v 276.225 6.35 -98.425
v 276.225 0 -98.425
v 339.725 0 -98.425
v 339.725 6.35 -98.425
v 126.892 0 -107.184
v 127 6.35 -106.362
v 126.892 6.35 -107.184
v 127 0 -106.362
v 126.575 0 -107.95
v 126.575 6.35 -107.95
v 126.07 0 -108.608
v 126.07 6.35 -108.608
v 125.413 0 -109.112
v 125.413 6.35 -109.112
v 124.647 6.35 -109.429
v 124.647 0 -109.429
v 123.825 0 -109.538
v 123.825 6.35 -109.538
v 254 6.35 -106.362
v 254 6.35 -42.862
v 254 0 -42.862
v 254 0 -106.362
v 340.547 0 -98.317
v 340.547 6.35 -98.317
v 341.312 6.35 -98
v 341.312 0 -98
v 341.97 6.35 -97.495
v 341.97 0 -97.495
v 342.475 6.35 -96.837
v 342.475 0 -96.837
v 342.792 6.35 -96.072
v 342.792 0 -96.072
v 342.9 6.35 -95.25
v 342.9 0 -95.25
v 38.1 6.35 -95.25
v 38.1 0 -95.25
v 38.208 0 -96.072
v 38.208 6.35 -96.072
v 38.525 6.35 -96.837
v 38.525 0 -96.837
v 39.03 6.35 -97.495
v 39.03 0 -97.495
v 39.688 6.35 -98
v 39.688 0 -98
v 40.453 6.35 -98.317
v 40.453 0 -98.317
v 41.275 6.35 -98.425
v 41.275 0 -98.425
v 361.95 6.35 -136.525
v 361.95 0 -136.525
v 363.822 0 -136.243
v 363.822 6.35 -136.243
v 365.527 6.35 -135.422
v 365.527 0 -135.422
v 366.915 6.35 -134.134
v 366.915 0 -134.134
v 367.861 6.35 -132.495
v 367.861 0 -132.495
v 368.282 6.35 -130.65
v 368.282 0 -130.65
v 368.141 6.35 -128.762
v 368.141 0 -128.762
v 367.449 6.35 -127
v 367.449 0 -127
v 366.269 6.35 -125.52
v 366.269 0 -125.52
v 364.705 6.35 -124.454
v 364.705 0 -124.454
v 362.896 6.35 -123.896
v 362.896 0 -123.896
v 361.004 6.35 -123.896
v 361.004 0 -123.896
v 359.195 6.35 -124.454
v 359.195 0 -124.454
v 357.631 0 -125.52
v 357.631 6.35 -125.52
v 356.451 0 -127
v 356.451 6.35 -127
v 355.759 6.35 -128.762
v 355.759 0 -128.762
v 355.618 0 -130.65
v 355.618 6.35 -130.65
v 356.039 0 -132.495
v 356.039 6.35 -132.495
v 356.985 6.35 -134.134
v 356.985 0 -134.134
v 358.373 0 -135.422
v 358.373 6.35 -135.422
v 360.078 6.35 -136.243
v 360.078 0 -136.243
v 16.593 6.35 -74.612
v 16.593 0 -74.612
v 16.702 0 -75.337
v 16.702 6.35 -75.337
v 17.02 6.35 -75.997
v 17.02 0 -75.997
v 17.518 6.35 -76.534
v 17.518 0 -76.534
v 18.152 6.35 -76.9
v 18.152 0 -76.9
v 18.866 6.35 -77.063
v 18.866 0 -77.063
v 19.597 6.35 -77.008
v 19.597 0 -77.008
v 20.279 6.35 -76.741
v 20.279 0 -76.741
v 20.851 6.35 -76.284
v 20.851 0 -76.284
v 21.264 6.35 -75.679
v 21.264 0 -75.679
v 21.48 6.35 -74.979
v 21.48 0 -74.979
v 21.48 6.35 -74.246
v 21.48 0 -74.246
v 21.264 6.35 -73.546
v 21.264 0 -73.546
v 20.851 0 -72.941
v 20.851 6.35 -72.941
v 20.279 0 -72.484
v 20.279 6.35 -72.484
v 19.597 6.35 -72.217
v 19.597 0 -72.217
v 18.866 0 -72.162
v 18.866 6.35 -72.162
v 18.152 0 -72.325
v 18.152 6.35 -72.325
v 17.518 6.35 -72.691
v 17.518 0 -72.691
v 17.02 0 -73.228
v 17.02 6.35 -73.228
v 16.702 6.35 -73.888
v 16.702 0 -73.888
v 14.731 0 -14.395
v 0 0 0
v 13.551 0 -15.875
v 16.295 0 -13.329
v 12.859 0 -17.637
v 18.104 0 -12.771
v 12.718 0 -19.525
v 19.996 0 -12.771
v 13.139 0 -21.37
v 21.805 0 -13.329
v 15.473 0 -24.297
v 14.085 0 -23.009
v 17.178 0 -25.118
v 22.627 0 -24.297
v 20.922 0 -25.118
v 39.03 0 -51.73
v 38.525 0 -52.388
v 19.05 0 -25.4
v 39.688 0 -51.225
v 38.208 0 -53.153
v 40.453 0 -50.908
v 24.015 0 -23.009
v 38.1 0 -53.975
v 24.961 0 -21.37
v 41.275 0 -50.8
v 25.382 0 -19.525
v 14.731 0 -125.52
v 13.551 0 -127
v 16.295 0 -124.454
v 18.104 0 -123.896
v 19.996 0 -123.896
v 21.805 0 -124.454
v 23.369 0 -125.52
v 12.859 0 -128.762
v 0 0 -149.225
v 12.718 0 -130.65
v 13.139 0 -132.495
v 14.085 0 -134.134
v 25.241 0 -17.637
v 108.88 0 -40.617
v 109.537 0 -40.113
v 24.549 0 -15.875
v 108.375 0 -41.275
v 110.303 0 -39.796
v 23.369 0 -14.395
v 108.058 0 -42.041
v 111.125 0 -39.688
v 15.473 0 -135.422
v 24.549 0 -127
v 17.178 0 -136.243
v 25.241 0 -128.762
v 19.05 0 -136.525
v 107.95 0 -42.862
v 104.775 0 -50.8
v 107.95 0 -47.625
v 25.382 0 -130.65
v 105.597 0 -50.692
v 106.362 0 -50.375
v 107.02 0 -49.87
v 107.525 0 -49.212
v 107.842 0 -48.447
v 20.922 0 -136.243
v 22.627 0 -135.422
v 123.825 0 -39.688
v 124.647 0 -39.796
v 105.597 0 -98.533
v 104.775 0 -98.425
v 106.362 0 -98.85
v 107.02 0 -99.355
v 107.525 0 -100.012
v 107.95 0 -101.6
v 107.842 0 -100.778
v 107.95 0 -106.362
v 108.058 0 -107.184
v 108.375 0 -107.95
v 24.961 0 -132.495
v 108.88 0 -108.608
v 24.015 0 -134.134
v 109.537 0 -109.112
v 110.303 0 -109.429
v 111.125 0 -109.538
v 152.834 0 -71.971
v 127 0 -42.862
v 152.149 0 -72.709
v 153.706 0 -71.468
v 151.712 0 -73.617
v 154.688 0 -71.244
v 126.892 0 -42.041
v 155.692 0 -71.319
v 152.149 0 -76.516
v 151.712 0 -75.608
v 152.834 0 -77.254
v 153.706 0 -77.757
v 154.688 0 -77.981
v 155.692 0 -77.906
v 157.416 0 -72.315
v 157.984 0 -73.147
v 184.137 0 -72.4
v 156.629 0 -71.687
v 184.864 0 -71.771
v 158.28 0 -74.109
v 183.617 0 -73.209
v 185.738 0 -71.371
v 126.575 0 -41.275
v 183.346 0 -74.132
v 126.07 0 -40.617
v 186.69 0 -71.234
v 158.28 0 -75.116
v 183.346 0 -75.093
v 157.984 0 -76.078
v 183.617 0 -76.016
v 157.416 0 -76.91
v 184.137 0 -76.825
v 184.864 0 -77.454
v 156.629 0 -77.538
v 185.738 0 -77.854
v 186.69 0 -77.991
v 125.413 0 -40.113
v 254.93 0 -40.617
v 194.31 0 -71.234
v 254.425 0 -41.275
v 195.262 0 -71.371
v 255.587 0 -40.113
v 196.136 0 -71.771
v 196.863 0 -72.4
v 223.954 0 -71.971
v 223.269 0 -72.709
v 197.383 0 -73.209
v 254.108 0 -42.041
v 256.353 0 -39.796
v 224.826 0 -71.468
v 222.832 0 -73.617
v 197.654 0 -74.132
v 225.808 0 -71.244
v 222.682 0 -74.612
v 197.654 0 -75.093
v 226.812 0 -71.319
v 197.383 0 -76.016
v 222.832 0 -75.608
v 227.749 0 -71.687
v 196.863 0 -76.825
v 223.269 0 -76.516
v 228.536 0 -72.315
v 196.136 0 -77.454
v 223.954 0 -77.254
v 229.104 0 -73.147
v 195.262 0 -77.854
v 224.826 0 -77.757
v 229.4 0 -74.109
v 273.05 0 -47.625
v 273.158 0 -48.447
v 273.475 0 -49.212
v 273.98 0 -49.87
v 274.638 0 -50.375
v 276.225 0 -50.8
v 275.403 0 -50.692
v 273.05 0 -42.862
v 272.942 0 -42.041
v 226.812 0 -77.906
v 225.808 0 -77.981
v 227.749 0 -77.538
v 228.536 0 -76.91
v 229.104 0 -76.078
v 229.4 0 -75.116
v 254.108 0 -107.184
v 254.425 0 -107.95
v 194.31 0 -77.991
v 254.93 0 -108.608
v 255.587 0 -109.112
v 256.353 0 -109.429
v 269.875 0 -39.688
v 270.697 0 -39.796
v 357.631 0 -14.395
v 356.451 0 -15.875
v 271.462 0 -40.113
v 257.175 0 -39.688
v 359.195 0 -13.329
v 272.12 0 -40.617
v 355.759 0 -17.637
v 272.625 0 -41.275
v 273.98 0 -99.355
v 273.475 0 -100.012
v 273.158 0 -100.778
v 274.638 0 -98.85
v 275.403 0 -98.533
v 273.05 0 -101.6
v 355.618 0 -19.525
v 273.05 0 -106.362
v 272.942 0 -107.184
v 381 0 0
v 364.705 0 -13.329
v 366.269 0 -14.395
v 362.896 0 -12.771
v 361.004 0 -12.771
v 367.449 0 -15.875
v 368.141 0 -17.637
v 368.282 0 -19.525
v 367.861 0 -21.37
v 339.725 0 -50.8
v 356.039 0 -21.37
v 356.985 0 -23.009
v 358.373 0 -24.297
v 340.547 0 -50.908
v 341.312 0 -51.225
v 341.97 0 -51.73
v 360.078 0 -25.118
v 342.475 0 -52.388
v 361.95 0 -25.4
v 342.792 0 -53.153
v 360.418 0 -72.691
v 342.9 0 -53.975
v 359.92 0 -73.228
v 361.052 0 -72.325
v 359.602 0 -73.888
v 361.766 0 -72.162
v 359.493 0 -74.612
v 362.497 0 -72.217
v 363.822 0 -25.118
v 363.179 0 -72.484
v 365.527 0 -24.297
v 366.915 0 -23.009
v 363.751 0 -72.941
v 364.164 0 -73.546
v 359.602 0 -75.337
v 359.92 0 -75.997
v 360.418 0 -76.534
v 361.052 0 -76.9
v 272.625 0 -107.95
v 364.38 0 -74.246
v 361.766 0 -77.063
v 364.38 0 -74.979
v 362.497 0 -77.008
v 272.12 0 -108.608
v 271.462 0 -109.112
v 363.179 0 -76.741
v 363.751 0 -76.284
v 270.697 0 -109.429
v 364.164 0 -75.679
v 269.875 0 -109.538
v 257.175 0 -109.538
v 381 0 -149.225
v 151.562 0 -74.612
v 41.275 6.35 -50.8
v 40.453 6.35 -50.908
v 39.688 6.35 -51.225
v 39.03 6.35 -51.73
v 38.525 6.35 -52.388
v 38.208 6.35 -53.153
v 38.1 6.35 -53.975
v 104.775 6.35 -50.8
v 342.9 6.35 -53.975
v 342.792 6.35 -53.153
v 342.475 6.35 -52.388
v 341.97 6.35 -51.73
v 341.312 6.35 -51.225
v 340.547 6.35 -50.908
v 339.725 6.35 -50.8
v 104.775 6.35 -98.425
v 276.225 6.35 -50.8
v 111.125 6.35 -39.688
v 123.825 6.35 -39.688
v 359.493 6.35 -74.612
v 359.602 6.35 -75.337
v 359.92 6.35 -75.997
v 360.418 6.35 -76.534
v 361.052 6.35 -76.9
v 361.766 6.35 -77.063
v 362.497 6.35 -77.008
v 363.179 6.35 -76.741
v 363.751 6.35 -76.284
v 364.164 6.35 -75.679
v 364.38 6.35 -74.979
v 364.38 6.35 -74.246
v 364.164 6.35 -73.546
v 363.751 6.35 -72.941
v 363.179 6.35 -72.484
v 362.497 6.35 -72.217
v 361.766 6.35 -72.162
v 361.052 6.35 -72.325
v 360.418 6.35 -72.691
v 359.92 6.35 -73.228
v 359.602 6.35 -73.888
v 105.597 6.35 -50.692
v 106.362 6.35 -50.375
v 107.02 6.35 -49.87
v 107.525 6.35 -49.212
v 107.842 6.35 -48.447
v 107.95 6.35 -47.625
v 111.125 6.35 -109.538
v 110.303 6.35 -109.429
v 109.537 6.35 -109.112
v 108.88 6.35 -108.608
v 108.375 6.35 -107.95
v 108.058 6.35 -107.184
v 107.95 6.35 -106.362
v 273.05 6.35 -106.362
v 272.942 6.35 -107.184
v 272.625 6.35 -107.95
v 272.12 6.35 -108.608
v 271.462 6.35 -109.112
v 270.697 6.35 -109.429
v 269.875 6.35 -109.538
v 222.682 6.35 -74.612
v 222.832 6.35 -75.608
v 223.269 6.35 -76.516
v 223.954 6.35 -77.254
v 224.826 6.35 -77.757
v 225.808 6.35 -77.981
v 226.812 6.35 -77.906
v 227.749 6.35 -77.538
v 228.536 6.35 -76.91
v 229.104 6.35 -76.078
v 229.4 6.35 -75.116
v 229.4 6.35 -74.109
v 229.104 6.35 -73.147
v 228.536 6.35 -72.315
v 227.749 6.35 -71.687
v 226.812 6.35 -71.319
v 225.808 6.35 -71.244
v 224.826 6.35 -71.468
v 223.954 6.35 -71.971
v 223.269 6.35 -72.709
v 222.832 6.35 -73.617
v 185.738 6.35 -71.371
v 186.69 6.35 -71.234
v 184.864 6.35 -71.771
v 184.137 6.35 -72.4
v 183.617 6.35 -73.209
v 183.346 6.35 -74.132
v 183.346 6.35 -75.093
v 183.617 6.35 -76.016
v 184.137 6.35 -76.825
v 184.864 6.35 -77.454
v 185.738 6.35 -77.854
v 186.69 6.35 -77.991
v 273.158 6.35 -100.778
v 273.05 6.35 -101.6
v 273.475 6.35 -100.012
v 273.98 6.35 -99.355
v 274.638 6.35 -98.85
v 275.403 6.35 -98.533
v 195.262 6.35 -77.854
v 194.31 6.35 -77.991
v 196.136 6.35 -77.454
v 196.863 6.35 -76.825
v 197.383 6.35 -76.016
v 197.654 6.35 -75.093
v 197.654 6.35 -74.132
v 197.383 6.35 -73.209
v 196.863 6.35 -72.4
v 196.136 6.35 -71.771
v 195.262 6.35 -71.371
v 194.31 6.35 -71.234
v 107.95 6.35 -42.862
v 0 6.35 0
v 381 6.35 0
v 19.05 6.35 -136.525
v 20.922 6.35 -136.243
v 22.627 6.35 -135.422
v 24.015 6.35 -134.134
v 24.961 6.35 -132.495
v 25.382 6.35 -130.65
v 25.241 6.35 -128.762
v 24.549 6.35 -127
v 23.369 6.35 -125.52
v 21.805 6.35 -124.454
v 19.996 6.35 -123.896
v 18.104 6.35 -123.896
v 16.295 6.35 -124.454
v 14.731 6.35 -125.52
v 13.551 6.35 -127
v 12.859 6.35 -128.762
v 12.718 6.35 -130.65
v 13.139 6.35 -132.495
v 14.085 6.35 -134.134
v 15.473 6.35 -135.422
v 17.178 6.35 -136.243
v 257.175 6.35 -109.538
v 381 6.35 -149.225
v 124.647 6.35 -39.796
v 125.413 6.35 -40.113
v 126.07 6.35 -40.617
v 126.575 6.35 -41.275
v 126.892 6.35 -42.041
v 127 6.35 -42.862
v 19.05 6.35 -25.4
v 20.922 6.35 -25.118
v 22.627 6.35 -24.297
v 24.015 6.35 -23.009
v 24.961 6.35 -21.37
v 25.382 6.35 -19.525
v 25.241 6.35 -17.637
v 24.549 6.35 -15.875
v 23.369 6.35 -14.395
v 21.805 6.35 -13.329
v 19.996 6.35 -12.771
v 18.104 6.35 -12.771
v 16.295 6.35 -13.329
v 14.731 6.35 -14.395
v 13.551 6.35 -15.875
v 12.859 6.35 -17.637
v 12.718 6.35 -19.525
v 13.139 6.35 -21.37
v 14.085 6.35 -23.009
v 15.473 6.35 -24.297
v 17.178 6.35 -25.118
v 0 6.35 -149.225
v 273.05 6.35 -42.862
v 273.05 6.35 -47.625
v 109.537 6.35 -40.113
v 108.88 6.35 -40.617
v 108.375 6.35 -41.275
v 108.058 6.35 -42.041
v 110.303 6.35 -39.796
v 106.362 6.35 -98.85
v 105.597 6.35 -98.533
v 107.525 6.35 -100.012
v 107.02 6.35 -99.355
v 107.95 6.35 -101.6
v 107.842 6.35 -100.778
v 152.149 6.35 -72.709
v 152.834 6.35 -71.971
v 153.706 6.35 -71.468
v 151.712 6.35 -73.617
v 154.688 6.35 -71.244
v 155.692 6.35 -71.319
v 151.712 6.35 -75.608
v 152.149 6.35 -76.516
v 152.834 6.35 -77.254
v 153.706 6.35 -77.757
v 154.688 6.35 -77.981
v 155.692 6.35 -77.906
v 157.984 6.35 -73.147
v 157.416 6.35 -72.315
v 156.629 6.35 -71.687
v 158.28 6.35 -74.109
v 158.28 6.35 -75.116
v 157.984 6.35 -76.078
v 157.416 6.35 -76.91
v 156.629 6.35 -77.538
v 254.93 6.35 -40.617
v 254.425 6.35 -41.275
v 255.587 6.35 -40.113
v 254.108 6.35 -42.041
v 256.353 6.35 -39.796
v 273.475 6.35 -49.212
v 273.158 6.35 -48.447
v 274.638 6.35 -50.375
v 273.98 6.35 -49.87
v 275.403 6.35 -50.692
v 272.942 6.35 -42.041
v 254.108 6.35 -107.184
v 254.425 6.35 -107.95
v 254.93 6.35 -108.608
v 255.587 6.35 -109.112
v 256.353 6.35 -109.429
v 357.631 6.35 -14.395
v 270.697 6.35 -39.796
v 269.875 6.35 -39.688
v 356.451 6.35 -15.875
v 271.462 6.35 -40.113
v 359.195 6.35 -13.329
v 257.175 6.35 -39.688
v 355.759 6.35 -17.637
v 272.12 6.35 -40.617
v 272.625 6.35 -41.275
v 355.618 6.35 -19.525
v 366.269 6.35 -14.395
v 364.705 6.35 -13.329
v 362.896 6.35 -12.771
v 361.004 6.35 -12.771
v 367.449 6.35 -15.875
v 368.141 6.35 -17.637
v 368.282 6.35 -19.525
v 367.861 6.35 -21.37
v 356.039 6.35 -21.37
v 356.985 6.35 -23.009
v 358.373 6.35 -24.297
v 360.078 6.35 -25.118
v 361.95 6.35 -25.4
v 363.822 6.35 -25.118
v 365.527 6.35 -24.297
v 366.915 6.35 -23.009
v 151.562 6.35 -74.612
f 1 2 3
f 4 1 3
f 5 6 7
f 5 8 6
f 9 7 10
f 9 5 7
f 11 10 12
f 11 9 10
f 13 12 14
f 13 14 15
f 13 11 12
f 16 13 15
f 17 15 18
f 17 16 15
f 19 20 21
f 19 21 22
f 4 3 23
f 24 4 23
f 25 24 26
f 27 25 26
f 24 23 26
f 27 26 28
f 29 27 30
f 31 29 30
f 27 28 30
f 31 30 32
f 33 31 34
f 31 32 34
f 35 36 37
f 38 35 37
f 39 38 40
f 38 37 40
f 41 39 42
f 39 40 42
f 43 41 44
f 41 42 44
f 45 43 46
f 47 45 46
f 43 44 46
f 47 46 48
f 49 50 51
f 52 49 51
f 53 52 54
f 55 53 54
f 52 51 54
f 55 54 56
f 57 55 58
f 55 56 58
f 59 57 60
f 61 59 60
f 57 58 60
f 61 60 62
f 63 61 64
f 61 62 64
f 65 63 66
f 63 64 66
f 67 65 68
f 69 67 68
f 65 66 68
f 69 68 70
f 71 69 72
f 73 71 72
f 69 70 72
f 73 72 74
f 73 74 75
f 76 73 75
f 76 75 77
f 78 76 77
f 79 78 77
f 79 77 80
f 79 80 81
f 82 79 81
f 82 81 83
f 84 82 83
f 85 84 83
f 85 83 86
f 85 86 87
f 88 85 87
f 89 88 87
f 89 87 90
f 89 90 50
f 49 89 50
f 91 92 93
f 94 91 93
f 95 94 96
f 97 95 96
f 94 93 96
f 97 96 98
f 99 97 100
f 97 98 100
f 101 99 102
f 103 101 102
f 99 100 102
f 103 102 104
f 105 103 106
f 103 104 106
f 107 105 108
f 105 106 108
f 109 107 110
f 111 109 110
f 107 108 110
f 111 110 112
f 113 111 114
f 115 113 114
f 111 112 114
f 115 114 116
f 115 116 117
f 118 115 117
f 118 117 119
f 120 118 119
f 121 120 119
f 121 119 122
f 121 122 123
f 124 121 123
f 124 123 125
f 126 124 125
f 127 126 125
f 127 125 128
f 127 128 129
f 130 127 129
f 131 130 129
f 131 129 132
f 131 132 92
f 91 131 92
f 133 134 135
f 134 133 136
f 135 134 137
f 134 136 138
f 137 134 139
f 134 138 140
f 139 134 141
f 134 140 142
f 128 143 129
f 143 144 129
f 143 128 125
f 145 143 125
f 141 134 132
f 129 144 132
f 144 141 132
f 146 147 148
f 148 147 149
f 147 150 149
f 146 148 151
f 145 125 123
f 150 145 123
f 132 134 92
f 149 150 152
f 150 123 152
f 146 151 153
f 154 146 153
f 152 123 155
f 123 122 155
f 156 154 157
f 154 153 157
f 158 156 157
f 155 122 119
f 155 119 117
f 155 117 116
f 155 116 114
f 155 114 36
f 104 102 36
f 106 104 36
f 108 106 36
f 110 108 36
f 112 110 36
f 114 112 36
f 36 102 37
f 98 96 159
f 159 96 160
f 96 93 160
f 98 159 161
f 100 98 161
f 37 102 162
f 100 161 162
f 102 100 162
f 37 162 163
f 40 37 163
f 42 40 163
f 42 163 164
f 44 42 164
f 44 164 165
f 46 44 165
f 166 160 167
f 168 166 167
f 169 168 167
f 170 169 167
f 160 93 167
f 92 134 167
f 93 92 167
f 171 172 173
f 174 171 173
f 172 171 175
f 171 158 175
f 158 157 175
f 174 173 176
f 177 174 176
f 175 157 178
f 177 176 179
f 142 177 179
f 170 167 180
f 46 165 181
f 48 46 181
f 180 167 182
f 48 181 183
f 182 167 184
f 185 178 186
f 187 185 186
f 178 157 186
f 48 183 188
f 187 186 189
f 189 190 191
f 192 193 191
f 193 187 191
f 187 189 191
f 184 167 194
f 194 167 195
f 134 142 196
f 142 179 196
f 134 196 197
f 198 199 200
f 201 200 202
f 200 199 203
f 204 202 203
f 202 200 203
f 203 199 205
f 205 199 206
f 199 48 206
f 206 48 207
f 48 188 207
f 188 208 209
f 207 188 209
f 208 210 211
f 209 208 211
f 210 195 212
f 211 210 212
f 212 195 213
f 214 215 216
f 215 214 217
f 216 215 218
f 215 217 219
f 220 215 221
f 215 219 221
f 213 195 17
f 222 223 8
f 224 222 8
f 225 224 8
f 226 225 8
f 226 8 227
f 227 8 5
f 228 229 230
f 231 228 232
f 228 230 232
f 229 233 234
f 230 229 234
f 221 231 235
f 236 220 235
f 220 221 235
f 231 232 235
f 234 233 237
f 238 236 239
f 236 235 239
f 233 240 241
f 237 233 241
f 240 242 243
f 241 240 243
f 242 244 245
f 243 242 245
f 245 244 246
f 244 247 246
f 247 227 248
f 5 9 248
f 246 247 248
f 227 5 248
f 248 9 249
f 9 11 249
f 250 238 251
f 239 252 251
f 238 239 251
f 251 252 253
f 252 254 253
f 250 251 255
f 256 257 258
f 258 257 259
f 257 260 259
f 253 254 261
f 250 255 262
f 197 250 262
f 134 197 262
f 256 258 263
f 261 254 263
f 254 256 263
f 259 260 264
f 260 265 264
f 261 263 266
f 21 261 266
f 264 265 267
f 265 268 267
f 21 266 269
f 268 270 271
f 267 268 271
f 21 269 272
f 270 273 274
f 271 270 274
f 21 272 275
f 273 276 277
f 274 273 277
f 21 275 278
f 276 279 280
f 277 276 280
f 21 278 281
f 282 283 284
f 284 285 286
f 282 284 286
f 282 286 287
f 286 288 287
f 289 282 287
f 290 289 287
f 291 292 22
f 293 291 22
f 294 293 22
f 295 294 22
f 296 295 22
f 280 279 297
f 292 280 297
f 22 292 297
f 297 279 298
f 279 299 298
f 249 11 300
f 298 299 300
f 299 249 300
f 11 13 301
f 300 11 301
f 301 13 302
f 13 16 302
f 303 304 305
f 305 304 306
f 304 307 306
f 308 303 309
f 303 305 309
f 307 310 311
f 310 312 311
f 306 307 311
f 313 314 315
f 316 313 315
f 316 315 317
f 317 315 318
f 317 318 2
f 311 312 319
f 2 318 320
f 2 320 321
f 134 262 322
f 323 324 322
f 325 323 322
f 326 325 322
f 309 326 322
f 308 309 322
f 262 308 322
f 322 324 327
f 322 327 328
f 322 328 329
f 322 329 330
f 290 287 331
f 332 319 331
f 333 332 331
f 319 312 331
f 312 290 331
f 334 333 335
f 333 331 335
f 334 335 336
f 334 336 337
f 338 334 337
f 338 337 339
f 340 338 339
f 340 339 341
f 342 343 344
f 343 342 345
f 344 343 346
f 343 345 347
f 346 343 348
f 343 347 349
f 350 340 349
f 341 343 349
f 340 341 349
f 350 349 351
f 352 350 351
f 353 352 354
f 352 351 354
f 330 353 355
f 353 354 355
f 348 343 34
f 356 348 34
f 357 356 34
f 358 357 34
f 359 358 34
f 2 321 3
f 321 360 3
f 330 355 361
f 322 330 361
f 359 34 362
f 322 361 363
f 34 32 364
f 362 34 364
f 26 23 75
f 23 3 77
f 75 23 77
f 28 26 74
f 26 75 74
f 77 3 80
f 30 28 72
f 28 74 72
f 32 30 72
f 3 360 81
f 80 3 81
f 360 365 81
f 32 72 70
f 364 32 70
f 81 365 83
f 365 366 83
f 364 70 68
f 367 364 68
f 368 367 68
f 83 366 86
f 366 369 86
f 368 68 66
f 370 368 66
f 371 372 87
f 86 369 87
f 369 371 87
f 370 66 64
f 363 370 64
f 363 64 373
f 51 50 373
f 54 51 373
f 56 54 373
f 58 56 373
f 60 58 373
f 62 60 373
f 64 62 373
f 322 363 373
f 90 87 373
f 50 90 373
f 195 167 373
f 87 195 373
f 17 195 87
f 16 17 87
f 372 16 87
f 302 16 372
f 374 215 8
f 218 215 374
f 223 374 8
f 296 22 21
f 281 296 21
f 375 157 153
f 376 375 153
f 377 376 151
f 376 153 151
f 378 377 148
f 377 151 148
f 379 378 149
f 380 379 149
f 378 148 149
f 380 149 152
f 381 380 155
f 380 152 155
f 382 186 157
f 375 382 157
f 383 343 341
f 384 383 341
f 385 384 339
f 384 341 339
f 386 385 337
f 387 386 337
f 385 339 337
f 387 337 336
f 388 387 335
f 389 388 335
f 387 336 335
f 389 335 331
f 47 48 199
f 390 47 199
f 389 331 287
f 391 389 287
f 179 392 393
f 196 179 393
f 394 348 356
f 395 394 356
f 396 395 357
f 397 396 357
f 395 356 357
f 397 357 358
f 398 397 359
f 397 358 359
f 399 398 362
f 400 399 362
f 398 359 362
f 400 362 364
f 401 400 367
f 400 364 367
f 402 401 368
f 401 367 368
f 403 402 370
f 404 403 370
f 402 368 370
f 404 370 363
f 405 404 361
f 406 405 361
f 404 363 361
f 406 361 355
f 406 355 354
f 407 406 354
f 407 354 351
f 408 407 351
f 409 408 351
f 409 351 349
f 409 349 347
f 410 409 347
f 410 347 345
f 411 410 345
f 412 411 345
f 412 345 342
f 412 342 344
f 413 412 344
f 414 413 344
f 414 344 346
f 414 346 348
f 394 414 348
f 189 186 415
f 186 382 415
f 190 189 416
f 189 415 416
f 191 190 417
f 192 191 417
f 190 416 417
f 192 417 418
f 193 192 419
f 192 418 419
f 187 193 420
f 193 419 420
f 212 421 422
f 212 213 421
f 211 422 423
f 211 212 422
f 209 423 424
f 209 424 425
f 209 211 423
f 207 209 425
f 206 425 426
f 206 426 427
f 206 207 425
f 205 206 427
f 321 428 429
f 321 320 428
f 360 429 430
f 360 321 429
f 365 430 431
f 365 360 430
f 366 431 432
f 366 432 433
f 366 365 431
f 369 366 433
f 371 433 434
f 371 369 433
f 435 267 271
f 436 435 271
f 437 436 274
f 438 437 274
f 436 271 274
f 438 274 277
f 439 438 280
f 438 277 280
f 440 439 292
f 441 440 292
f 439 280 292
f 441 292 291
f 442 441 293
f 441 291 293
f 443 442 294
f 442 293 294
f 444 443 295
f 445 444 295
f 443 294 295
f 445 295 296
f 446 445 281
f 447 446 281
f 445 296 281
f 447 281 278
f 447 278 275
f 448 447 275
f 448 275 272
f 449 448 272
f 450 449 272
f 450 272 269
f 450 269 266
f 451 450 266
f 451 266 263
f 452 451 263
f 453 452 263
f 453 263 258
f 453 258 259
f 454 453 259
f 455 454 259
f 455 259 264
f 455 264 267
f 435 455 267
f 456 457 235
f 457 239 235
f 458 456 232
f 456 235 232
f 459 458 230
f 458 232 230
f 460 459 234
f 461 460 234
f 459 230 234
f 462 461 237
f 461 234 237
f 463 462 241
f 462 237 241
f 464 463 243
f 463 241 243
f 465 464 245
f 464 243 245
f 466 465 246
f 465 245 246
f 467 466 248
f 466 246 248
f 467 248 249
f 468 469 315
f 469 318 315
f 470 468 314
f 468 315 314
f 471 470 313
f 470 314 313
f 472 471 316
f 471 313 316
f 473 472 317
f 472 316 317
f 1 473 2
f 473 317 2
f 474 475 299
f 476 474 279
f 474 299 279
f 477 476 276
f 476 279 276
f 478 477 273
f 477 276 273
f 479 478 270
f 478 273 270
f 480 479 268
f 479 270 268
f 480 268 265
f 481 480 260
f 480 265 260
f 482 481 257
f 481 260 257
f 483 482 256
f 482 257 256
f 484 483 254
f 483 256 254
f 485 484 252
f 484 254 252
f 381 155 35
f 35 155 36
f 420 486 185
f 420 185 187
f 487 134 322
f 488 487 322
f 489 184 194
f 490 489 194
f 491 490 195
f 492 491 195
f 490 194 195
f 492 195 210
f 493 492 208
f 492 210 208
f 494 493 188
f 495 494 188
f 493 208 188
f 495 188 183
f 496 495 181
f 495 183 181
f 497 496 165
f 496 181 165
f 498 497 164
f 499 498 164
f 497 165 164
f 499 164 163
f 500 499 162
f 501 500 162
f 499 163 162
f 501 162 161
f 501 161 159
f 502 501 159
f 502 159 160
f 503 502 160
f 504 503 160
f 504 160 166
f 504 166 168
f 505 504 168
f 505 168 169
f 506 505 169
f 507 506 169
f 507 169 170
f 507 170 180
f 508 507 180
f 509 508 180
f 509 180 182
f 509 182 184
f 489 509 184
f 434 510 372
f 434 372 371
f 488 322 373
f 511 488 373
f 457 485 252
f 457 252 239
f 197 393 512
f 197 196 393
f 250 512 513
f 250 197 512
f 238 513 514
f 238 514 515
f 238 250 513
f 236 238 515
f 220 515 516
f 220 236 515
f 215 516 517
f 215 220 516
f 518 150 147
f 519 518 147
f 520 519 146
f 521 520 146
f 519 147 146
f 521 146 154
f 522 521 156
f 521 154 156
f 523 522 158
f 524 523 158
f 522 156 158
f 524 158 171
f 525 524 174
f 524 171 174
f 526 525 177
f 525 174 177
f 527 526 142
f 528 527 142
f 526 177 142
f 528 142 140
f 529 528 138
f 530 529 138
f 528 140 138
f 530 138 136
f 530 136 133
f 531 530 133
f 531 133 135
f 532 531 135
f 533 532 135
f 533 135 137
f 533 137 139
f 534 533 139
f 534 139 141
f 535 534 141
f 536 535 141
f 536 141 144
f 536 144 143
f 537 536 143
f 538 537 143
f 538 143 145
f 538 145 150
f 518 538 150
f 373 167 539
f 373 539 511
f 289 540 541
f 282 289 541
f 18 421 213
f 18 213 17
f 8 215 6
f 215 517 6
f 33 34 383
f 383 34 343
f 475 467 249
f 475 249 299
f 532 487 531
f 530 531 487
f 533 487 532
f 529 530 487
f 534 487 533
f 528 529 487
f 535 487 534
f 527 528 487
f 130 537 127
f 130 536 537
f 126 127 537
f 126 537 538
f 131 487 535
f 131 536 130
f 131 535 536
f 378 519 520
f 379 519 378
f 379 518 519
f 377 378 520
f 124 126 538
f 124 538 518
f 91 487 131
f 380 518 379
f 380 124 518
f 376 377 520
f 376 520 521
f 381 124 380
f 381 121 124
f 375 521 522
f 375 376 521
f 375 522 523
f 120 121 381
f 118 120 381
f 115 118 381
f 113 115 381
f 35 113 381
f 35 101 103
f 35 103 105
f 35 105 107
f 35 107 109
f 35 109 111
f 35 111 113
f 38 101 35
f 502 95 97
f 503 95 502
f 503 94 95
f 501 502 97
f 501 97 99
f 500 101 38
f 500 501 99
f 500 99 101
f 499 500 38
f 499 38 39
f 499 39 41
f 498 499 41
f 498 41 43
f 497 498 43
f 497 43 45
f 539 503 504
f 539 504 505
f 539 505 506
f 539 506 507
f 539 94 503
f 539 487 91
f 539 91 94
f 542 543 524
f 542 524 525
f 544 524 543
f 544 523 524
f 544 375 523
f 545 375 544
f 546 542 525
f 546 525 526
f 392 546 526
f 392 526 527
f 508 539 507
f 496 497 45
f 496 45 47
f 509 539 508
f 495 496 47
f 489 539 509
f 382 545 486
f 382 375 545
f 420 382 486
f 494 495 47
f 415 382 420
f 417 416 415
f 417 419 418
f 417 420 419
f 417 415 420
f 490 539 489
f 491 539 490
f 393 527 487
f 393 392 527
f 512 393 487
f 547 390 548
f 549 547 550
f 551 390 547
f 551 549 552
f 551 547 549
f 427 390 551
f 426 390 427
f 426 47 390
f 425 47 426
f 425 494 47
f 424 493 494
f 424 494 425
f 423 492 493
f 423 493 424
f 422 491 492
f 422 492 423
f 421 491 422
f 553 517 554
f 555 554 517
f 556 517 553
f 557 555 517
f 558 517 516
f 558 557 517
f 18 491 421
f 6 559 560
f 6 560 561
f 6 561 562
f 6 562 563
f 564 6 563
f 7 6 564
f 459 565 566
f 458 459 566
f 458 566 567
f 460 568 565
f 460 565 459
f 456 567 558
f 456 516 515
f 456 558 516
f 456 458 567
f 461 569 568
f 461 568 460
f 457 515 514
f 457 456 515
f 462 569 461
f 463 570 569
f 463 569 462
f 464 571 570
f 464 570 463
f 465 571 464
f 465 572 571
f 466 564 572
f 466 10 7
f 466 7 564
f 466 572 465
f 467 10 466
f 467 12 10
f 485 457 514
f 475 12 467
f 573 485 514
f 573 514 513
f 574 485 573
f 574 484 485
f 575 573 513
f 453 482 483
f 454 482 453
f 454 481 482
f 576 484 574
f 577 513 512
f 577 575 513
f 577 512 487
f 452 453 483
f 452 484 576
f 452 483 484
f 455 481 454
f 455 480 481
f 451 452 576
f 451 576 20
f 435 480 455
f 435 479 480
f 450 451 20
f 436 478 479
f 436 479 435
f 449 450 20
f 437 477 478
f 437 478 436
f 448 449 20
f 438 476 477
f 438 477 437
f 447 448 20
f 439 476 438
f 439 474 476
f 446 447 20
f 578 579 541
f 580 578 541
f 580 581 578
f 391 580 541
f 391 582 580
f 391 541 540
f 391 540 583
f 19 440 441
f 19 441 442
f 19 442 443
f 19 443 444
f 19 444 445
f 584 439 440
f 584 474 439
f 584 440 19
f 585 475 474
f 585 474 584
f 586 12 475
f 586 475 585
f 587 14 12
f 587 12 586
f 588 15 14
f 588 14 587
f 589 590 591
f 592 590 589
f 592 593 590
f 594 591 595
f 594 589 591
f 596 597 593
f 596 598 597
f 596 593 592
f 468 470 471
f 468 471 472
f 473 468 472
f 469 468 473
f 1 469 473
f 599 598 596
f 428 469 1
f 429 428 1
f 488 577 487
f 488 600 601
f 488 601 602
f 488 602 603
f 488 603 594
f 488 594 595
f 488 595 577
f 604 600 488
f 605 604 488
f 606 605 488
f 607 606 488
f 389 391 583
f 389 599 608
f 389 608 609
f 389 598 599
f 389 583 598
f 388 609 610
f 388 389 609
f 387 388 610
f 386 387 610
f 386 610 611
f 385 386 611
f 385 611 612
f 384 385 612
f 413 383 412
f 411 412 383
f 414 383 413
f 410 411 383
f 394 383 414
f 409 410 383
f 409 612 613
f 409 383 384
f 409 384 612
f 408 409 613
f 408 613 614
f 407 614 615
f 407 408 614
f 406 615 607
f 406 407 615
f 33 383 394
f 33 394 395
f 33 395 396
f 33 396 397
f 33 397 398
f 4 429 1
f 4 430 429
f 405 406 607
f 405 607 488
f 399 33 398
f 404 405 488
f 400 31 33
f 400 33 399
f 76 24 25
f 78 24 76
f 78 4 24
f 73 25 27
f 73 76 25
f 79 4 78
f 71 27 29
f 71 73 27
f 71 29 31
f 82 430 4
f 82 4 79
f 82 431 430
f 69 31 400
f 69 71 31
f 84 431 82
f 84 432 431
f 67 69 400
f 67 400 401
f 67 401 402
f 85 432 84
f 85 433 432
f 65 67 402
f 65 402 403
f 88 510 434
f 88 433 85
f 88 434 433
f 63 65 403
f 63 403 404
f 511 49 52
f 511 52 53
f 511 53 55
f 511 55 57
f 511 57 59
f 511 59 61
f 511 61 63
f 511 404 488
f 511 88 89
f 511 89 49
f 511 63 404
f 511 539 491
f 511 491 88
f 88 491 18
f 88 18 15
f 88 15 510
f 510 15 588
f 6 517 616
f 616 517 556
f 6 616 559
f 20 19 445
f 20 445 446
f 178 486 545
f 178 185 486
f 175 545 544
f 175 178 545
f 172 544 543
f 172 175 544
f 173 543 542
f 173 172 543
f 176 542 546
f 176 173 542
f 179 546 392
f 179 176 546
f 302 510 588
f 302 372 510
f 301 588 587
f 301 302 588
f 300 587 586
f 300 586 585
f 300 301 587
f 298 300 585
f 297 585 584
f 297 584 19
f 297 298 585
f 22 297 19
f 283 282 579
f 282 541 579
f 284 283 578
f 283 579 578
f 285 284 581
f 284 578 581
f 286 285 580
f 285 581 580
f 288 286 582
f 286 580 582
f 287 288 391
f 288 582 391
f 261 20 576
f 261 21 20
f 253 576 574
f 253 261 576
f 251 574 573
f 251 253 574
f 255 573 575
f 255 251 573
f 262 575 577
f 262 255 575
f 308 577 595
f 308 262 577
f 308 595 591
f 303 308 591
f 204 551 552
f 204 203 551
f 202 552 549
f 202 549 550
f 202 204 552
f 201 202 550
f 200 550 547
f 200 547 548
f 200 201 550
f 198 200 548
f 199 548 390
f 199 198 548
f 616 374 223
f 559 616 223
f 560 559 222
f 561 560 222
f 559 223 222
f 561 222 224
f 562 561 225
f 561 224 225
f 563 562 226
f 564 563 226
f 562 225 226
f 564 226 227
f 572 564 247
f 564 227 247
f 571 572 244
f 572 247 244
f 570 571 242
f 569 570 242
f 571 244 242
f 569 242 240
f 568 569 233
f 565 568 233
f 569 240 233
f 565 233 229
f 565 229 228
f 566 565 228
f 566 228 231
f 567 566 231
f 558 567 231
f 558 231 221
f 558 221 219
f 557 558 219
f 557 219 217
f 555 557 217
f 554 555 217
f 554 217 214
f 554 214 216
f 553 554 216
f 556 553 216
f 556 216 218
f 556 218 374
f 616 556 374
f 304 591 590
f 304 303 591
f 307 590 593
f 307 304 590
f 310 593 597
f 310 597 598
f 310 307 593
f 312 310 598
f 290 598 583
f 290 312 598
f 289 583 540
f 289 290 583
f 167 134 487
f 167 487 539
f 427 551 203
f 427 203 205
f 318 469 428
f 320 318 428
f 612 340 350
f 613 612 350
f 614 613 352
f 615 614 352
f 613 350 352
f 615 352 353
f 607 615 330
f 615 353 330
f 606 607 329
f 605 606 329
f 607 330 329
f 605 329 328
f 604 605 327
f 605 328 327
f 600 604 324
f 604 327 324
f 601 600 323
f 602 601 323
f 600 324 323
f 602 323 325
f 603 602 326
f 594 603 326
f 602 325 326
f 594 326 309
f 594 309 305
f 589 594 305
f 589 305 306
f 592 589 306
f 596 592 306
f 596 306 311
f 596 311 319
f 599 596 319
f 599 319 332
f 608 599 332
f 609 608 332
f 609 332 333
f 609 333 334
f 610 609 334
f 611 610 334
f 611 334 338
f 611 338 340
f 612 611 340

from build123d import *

# Parameters (mm, degrees)
SKETCH1_W                    = 381
SKETCH1_H                    = 149.225
BOSS_EXTRUDE1_DEPTH          = 6.35
F_1_4_CLEARANCE_HOLE1_D      = 6.7564
CUT_EXTRUDE1_DEPTH           = 410.23028129
F_1_2_0_5_DIAMETER_HOLE1_D   = 12.7
F_10_0_1935_DIAMETER_HOLE1_D = 4.9149
SKETCH9_W                    = 19.05
SKETCH9_H                    = 14.2875
CUT_EXTRUDE2_DEPTH           = 410.23028129
FILLET1_R                    = 3.175


with BuildPart() as part:
    # Sketch1 → Boss-Extrude1 (new body)
    with BuildSketch(Plane(origin=(0, 0, 0), x_dir=(1, 0, 0), z_dir=(0, 1, 0))):
        with Locations((190.5, 74.6125)):
            Rectangle(SKETCH1_W, SKETCH1_H)
        with BuildLine():
            Line((342.9, 95.25), (342.9, 53.975))
            ThreePointArc((342.9, 53.975), (341.97006403, 51.72993597), (339.725, 50.8))
            Line((339.725, 50.8), (257.175, 50.8))
            ThreePointArc((257.175, 50.8), (254.92993597, 51.72993597), (254, 53.975))
            Line((254, 53.975), (254, 95.25))
            ThreePointArc((254, 95.25), (254.92993597, 97.49506403), (257.175, 98.425))
            Line((257.175, 98.425), (339.725, 98.425))
            ThreePointArc((339.725, 98.425), (341.97006403, 97.49506403), (342.9, 95.25))
        make_face(mode=Mode.SUBTRACT)
        with BuildLine():
            Line((41.275, 98.425), (123.825, 98.425))
            ThreePointArc((123.825, 98.425), (126.07006403, 97.49506403), (127, 95.25))
            Line((127, 95.25), (127, 53.975))
            ThreePointArc((127, 53.975), (126.07006403, 51.72993597), (123.825, 50.8))
            Line((123.825, 50.8), (41.275, 50.8))
            ThreePointArc((41.275, 50.8), (39.02993597, 51.72993597), (38.1, 53.975))
            Line((38.1, 53.975), (38.1, 95.25))
            ThreePointArc((38.1, 95.25), (39.02993597, 97.49506403), (41.275, 98.425))
        make_face(mode=Mode.SUBTRACT)
    extrude(amount=BOSS_EXTRUDE1_DEPTH)

    # 1/4 Clearance Hole1 (through all)
    with Locations(Plane(origin=(0, 6.35, 0), x_dir=(1, 0, 0), z_dir=(0, 1, 0))):
        with Locations((154.94, 74.6125), (186.69, 74.6125), (194.31, 74.6125), (226.06, 74.6125)):
            Hole(F_1_4_CLEARANCE_HOLE1_D / 2)

    # Sketch4 → Cut-Extrude1 (cut, through all)
    with BuildSketch(Plane(origin=(0, 6.35, 0), x_dir=(1, 0, 0), z_dir=(0, 1, 0))):
        with BuildLine():
            Line((186.69, 77.9907), (194.31, 77.9907))
            ThreePointArc((194.31, 77.9907), (197.6882, 74.6125), (194.31, 71.2343))
            Line((194.31, 71.2343), (186.69, 71.2343))
            ThreePointArc((186.69, 71.2343), (183.3118, 74.6125), (186.69, 77.9907))
        make_face()
    extrude(amount=-CUT_EXTRUDE1_DEPTH, mode=Mode.SUBTRACT)

    # 1/2 (0.5) Diameter Hole1 (through all)
    with Locations(Plane(origin=(19.05, 6.35, -130.175), x_dir=(0, 0, 1), z_dir=(0, 1, 0))):
        with Locations((0, 0), (111.125, 0), (0, 342.9), (111.125, 342.9)):
            Hole(F_1_2_0_5_DIAMETER_HOLE1_D / 2)

    # #10 (0.1935) Diameter Hole1 (through all)
    with Locations(Plane(origin=(0, 6.35, 0), x_dir=(1, 0, 0), z_dir=(0, 1, 0))):
        with Locations((19.05, 74.6125), (361.95, 74.6125)):
            Hole(F_10_0_1935_DIAMETER_HOLE1_D / 2)

    # Sketch9 → Cut-Extrude2 (cut, through all)
    with BuildSketch(Plane(origin=(0, 6.35, 0), x_dir=(1, 0, 0), z_dir=(0, 1, 0))):
        with Locations((117.475, 102.39375)):
            Rectangle(SKETCH9_W, SKETCH9_H)
        with Locations((117.475, 46.83125)):
            Rectangle(SKETCH9_W, SKETCH9_H)
        with Locations((263.525, 46.83125)):
            Rectangle(SKETCH9_W, SKETCH9_H)
        with Locations((263.525, 102.39375)):
            Rectangle(SKETCH9_W, SKETCH9_H)
    extrude(amount=-CUT_EXTRUDE2_DEPTH, mode=Mode.SUBTRACT)

    # Fillet1
    fillet1_edges = [part.edges().sort_by_distance(p)[0] for p in [
        (273.05, 3.175, -50.8),
        (273.05, 3.175, -98.425),
        (107.95, 3.175, -98.425),
        (107.95, 3.175, -50.8),
        (273.05, 3.175, -109.5375),
        (254, 3.175, -109.5375),
        (273.05, 3.175, -39.6875),
        (254, 3.175, -39.6875),
        (107.95, 3.175, -39.6875),
        (127, 3.175, -39.6875),
        (107.95, 3.175, -109.5375),
        (127, 3.175, -109.5375),
    ]]
    fillet(fillet1_edges, radius=FILLET1_R)


solid = part.part
